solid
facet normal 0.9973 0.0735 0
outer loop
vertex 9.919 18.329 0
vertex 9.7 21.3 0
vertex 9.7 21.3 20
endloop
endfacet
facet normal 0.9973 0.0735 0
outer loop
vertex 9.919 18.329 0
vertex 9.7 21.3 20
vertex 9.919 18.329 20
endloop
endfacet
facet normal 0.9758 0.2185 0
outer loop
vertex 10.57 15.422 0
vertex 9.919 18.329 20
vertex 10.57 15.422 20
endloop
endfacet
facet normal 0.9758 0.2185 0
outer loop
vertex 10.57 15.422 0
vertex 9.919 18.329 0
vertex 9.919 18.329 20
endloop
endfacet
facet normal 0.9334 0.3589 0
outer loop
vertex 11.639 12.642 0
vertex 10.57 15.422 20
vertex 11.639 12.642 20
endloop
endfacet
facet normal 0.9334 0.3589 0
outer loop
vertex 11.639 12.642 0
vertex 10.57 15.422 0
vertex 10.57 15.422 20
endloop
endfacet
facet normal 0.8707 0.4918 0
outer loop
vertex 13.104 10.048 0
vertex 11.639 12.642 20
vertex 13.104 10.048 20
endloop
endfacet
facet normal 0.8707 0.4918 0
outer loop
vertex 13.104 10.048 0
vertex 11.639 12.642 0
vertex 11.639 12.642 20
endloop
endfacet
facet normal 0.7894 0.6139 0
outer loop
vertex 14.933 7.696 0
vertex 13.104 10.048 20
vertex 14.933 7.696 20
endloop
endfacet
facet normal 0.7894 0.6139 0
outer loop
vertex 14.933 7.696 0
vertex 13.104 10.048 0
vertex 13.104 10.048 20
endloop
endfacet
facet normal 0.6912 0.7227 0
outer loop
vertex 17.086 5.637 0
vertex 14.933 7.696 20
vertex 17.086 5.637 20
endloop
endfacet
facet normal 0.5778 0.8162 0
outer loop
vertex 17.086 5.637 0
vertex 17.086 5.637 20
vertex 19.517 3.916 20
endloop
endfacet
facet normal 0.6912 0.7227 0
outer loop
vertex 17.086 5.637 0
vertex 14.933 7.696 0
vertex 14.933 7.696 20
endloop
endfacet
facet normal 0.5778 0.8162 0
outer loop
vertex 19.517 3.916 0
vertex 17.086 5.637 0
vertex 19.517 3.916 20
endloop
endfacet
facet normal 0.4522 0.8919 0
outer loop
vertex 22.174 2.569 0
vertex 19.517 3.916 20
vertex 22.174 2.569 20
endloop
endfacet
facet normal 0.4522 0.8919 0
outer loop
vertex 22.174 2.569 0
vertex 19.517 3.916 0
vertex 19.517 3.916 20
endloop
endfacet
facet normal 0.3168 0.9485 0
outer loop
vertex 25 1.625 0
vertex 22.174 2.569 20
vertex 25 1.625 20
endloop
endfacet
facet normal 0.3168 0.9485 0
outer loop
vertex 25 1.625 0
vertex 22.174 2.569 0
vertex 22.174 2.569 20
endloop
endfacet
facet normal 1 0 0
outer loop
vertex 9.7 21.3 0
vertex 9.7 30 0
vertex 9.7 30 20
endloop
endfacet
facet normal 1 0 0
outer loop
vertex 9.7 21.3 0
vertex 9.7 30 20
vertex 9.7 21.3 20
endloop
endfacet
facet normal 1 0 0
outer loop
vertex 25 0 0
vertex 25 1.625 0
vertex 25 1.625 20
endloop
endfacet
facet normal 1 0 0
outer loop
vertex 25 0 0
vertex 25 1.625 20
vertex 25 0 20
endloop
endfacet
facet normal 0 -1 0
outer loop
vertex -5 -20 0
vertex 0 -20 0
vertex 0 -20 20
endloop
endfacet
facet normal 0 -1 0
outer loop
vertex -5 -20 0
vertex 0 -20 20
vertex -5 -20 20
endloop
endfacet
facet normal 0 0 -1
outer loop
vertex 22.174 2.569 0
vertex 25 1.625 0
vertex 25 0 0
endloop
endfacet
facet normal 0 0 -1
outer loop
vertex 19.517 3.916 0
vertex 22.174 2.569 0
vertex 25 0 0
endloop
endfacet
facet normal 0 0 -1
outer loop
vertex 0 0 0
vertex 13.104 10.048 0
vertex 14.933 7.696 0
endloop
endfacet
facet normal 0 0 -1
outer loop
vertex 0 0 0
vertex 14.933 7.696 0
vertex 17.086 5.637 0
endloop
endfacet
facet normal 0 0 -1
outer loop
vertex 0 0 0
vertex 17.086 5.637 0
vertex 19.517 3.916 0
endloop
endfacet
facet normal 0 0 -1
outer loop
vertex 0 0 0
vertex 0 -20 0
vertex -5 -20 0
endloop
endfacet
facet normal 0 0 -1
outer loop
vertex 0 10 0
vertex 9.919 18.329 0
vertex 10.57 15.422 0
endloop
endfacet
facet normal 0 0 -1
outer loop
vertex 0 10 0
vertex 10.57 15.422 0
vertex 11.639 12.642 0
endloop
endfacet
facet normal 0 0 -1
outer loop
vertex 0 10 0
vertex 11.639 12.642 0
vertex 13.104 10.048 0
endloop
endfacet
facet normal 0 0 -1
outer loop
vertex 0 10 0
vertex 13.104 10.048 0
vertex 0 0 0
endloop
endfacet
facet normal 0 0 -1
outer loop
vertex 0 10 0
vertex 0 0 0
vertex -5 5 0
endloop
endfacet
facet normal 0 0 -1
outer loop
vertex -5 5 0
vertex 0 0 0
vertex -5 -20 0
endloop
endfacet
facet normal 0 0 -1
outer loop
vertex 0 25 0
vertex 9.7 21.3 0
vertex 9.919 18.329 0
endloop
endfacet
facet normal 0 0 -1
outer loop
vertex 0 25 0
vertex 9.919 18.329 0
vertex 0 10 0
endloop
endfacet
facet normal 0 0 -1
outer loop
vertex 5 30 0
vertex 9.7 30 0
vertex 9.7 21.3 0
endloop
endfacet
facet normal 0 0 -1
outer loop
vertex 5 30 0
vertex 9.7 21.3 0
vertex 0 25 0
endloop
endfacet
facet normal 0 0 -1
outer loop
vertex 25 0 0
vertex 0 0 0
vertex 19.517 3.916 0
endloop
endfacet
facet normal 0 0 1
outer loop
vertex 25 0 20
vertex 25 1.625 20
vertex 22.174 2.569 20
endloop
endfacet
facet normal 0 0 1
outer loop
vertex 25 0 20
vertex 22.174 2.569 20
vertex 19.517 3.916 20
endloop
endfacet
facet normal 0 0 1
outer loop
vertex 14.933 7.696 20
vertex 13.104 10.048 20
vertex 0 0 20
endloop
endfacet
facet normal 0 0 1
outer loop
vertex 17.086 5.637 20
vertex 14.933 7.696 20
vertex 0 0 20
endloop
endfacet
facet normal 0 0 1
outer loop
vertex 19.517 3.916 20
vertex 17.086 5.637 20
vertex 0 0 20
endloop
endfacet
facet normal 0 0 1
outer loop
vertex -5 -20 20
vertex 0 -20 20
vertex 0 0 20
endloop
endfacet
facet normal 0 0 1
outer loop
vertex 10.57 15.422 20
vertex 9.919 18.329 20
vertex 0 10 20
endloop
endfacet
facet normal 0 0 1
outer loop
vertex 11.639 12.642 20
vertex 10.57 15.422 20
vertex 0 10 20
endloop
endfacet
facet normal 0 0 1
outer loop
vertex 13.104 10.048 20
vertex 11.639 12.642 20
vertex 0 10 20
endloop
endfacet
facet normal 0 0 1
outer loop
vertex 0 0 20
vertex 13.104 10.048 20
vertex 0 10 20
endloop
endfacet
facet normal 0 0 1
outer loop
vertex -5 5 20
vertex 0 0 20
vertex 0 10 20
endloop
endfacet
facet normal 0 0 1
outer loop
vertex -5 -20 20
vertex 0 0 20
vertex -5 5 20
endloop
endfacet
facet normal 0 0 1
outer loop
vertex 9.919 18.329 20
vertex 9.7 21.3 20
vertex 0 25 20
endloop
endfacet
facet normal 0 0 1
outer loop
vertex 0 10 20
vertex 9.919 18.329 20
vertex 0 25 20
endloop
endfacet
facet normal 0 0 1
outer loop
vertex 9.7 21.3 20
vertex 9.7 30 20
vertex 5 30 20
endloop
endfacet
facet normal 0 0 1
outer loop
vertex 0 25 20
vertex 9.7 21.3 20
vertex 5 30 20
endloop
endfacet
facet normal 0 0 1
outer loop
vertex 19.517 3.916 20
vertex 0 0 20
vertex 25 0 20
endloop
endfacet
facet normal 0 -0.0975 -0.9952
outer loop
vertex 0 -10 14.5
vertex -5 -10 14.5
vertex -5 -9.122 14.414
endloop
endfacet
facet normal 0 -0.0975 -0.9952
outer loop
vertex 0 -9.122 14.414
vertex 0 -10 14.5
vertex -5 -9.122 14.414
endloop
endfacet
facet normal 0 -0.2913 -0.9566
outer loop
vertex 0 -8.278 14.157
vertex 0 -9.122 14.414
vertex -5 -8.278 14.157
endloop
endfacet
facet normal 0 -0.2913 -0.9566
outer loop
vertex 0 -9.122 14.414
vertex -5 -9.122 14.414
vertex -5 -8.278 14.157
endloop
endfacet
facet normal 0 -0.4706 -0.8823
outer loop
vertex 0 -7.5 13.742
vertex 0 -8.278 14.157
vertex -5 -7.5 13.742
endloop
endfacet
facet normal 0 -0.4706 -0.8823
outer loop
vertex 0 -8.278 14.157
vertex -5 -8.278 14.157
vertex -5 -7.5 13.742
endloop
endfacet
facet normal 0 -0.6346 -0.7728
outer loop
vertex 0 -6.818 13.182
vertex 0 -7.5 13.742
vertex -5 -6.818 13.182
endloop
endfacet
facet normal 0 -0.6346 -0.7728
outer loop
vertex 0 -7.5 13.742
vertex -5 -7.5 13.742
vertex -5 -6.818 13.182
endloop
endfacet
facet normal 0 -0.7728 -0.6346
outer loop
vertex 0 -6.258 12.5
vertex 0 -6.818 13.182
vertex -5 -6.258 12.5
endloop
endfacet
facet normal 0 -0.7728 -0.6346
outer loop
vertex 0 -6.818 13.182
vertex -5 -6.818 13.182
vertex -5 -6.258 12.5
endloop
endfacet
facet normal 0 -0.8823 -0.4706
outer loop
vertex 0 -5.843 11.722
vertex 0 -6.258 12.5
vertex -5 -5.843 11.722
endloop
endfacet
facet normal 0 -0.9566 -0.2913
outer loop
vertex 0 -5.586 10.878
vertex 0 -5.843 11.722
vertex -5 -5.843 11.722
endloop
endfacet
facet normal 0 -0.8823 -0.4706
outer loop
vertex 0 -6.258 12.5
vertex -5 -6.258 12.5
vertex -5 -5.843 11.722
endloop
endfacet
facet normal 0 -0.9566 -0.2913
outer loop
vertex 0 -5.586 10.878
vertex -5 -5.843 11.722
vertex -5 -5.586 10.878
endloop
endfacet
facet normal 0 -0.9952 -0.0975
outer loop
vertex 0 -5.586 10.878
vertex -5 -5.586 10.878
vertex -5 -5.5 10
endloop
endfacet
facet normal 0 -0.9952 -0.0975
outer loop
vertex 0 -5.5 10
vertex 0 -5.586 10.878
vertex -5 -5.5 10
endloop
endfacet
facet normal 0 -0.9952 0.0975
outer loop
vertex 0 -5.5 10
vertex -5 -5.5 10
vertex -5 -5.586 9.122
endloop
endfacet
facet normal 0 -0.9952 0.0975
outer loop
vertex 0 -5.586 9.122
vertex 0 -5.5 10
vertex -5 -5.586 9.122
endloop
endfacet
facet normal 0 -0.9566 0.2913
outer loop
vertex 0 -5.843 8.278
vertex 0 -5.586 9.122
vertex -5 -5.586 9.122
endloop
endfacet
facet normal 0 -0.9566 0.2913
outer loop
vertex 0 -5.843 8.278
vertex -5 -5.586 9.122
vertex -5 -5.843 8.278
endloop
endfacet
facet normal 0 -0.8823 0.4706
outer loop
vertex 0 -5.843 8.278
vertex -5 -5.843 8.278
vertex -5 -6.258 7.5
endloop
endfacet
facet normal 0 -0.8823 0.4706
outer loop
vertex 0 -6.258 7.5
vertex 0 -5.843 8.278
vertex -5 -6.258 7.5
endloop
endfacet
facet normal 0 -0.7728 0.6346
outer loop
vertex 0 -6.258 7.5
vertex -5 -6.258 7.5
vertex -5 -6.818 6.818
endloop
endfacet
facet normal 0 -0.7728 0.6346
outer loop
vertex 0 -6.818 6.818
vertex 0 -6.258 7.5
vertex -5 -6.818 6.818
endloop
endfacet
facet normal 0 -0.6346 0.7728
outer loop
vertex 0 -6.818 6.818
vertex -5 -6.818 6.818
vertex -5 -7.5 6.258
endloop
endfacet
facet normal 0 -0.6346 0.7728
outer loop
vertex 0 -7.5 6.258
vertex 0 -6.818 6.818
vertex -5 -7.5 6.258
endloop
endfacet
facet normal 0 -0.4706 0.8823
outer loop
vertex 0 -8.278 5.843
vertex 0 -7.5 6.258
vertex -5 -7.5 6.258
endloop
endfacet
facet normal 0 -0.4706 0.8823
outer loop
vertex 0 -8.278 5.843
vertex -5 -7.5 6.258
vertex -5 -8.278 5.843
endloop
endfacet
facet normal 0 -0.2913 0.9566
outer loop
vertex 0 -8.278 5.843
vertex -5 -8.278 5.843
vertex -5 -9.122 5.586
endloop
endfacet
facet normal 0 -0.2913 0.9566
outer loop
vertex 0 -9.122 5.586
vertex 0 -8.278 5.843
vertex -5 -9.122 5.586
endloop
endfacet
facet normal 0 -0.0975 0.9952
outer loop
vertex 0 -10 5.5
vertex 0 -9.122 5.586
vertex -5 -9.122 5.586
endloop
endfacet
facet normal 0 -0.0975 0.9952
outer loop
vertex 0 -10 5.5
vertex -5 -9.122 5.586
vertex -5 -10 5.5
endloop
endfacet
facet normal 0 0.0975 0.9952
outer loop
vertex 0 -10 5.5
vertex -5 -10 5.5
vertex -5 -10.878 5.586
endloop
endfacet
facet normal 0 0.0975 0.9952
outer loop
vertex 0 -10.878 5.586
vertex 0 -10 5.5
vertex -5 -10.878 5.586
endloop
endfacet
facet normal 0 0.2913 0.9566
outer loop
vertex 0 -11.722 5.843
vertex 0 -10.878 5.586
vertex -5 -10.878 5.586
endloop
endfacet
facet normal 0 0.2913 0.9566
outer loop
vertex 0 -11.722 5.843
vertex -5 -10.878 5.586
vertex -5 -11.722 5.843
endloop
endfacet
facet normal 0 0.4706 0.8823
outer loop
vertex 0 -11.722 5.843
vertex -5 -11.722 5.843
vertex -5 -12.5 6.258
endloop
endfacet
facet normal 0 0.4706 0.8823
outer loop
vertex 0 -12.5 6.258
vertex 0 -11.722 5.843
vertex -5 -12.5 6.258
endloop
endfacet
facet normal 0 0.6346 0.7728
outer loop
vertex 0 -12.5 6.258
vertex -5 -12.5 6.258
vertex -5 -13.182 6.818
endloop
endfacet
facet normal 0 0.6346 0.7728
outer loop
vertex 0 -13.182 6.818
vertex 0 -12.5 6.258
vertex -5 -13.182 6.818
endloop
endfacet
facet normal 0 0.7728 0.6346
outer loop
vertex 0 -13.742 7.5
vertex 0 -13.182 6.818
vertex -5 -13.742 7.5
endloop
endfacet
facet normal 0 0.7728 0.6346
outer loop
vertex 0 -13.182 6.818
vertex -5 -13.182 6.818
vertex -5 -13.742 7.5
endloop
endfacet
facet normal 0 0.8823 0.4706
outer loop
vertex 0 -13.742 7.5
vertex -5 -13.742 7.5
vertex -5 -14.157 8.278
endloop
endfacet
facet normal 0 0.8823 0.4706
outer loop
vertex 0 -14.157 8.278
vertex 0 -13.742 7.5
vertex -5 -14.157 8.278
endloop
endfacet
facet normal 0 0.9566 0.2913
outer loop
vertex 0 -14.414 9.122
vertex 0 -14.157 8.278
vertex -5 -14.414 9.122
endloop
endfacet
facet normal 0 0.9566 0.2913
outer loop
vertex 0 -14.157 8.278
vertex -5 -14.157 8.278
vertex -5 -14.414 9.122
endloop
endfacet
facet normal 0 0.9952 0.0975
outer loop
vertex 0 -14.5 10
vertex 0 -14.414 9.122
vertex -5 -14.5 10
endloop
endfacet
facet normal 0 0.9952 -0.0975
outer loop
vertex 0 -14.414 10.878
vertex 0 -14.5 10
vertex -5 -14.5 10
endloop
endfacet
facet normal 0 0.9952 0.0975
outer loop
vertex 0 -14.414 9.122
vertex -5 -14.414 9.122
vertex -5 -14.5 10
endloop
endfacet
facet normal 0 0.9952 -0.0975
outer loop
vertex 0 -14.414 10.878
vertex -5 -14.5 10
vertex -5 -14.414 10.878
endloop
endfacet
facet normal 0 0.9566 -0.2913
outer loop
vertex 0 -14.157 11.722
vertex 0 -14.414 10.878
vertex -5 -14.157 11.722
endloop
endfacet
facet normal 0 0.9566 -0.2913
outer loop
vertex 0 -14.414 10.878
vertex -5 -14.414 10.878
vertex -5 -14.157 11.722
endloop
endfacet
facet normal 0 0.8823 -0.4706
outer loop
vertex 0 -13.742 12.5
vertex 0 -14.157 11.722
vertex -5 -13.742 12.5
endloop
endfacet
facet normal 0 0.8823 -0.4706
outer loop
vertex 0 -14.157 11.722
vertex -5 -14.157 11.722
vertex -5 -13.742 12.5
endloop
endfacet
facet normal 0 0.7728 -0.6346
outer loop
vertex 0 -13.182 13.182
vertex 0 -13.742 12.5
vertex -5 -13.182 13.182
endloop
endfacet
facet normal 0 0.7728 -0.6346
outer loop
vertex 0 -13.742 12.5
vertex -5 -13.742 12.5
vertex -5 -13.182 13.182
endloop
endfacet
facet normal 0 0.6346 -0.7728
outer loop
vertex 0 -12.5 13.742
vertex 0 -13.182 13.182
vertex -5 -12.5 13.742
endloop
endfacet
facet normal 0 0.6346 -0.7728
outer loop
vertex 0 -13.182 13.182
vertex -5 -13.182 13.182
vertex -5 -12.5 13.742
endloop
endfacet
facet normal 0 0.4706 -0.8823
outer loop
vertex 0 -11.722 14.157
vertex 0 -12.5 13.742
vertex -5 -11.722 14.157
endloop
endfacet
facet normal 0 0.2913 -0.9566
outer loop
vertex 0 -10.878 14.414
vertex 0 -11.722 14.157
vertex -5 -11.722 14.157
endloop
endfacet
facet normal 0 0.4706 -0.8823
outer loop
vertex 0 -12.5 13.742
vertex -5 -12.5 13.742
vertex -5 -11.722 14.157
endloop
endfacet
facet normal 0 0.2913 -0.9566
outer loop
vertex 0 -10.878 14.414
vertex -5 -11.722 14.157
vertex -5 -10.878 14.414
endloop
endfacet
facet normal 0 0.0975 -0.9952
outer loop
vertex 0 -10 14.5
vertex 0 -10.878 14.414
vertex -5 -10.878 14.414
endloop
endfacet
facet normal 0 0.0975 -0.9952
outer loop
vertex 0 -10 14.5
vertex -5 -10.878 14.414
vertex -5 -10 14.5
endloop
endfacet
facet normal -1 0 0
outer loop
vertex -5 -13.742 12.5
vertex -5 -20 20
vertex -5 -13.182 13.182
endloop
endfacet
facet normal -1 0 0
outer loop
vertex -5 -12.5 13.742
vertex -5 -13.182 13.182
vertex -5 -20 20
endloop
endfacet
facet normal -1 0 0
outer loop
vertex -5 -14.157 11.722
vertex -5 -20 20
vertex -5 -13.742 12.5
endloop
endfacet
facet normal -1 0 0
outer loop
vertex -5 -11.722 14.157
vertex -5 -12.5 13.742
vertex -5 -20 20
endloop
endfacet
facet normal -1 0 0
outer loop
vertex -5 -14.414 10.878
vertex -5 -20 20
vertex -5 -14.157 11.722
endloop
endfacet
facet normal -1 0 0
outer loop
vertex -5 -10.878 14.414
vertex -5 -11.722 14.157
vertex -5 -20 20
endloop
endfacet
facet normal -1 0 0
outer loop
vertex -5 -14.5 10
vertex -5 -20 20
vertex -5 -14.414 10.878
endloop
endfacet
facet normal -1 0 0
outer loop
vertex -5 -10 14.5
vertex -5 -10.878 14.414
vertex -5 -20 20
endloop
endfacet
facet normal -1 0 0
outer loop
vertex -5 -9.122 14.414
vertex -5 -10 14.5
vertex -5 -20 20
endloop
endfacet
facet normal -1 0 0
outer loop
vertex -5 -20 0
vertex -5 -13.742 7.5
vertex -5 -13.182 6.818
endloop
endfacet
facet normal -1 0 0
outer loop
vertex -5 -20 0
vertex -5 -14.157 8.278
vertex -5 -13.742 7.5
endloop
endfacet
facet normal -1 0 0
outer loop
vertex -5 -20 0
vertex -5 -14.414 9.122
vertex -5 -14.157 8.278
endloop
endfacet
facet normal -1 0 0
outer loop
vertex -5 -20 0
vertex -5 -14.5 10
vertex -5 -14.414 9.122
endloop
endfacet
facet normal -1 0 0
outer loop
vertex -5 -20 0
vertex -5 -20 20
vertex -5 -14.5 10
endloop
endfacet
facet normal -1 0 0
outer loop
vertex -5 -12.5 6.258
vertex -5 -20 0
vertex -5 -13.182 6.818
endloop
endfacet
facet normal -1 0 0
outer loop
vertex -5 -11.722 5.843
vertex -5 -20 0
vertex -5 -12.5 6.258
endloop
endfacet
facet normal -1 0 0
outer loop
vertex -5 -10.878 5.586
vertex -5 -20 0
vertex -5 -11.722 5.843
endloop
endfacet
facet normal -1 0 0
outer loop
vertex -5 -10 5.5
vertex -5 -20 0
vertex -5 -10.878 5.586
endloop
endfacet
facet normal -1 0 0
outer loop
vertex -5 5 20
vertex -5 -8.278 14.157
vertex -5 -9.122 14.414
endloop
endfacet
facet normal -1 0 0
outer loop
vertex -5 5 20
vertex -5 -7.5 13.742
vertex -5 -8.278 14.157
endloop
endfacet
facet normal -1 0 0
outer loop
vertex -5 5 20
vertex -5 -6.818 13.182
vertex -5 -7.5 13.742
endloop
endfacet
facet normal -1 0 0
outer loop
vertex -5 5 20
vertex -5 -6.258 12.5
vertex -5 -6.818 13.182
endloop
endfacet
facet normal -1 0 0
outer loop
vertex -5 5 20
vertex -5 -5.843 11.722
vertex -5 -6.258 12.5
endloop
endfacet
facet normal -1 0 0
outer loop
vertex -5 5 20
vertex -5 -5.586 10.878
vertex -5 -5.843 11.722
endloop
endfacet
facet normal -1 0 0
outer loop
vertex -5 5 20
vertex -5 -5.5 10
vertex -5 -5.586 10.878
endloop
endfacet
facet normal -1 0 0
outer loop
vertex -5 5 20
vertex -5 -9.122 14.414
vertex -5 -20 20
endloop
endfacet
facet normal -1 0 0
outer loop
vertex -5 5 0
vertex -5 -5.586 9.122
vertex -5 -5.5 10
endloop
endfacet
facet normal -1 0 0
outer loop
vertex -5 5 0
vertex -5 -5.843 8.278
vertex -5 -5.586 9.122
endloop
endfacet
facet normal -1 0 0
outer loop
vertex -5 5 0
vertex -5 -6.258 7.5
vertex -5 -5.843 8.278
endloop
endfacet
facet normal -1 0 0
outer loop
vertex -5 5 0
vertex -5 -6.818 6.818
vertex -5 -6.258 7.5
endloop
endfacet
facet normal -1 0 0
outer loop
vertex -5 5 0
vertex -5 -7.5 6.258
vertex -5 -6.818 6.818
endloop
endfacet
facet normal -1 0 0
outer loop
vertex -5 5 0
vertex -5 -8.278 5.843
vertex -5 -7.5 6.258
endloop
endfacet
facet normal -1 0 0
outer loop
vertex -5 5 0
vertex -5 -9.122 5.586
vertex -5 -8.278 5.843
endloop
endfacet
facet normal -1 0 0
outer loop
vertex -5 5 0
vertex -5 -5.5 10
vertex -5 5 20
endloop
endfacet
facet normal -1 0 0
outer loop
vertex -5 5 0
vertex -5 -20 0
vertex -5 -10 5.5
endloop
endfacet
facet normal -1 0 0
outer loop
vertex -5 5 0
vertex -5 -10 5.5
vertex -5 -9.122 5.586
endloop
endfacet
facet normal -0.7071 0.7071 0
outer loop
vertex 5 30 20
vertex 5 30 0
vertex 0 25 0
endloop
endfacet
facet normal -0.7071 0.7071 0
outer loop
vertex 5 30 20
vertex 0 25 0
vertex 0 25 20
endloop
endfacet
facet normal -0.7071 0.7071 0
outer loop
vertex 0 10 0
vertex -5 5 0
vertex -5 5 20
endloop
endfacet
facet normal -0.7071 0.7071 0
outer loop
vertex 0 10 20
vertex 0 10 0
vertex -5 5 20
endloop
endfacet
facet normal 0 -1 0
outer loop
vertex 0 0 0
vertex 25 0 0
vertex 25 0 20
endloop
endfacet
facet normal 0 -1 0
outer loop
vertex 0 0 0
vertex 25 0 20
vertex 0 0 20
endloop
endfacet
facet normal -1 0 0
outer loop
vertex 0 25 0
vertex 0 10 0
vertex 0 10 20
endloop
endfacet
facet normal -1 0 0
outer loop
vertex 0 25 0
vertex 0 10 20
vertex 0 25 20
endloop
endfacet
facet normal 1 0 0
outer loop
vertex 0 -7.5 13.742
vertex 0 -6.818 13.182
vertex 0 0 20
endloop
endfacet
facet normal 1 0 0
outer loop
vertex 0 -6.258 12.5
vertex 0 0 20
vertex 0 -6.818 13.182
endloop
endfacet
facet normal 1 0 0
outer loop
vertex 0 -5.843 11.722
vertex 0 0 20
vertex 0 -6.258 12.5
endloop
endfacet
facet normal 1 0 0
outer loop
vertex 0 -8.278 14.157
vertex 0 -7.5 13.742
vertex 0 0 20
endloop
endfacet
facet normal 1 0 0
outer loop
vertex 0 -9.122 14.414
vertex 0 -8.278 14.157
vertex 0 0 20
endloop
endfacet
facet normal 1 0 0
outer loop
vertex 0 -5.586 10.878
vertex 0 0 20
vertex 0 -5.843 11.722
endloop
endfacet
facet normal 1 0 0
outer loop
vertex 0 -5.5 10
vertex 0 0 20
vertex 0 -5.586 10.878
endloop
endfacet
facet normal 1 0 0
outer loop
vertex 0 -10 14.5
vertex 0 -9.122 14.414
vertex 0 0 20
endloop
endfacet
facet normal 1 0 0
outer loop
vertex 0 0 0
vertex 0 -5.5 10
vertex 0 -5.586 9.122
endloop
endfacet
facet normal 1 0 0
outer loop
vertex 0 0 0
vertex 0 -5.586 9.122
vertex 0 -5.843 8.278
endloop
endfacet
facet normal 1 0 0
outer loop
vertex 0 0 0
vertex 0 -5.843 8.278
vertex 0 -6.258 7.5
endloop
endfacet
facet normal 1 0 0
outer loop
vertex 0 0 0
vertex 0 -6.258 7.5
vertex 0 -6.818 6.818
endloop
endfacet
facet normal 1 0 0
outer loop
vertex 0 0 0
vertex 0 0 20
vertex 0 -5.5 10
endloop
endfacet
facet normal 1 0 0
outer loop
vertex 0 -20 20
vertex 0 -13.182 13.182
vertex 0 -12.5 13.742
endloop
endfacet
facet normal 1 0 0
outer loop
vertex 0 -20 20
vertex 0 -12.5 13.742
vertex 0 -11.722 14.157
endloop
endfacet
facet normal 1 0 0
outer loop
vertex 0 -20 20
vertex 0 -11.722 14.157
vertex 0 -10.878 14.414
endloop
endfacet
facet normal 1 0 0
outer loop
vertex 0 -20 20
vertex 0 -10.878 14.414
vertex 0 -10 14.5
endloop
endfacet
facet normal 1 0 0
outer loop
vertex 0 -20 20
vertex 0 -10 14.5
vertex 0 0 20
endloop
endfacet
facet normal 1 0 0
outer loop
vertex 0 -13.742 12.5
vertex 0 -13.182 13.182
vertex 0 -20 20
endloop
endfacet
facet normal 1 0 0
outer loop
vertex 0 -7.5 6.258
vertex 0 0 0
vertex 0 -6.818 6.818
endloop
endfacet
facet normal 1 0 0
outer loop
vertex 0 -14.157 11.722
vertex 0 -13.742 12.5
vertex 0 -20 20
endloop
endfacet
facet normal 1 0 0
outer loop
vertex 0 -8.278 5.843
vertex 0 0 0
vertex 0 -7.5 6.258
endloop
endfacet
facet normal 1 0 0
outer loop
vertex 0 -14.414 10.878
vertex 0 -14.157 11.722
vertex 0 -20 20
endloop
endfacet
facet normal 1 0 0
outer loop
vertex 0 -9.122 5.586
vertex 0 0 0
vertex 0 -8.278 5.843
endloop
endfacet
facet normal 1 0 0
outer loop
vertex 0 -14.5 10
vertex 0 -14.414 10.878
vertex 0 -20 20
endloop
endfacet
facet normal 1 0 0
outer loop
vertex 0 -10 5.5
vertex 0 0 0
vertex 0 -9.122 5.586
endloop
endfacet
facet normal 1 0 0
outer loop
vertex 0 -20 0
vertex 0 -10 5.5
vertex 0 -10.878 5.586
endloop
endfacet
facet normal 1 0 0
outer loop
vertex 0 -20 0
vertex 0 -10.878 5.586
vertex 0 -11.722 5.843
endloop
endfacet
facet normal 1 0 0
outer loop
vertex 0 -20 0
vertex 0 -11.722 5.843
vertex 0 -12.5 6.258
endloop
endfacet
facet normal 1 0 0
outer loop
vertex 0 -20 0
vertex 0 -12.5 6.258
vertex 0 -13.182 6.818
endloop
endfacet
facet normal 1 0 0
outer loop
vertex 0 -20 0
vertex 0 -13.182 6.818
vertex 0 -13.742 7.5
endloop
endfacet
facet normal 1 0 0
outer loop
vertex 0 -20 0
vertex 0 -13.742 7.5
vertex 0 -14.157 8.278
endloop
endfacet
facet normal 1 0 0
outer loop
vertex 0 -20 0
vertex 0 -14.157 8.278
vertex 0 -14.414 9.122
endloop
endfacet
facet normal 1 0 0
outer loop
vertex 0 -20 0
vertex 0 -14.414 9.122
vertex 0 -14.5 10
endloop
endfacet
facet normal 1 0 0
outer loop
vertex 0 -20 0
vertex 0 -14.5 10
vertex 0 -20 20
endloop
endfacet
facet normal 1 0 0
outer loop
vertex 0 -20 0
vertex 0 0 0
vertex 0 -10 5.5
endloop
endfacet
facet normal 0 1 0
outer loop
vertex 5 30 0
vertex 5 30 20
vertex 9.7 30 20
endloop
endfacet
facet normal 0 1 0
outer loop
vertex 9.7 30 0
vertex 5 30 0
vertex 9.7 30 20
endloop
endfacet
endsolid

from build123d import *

# Parameters (mm, degrees)
EXTRUDE_1_DEPTH     = 20
SKETCH_3_R          = 4.5
CUT_EXTRUDE_2_DEPTH = 20
CHAMFER_1_SIZE      = 5
CHAMFER_2_SIZE      = 5


with BuildPart() as part:
    # 草图1 → 凸台-拉伸1 (new body)
    with BuildSketch(Plane.XY):
        with BuildLine():
            Line((0, 5), (0, 30))
            Line((0, 30), (9.7, 30))
            Line((9.7, 30), (9.7, 21.3))
            ThreePointArc((9.7, 21.3), (13.975175508, 8.838258549), (25, 1.625397082))
            Line((25, 1.625397082), (25, 0))
            Line((25, 0), (6.25, 0))
            Line((6.25, 0), (0, 0))
            Line((0, 0), (0, -20))
            Line((0, -20), (-5, -20))
            Line((-5, -20), (-5, 5))
            Line((-5, 5), (0, 5))
        make_face()
    extrude(amount=EXTRUDE_1_DEPTH)

    # 草图3 → 切除-拉伸2 (cut)
    with BuildSketch(Plane.ZY.offset(5)):
        with Locations((10, -10)):
            Circle(SKETCH_3_R)
    extrude(amount=-CUT_EXTRUDE_2_DEPTH, mode=Mode.SUBTRACT)

    # 倒角1
    chamfer_1_edges = [part.edges().sort_by_distance(p)[0] for p in [
        (0, 5, 10),
    ]]
    chamfer(chamfer_1_edges, length=CHAMFER_1_SIZE - 0.0001)  # a hair under: the kernel refuses the full size

    # 倒角2
    chamfer_2_edges = [part.edges().sort_by_distance(p)[0] for p in [
        (0, 30, 10),
    ]]
    chamfer(chamfer_2_edges, length=CHAMFER_2_SIZE)


solid = part.part
